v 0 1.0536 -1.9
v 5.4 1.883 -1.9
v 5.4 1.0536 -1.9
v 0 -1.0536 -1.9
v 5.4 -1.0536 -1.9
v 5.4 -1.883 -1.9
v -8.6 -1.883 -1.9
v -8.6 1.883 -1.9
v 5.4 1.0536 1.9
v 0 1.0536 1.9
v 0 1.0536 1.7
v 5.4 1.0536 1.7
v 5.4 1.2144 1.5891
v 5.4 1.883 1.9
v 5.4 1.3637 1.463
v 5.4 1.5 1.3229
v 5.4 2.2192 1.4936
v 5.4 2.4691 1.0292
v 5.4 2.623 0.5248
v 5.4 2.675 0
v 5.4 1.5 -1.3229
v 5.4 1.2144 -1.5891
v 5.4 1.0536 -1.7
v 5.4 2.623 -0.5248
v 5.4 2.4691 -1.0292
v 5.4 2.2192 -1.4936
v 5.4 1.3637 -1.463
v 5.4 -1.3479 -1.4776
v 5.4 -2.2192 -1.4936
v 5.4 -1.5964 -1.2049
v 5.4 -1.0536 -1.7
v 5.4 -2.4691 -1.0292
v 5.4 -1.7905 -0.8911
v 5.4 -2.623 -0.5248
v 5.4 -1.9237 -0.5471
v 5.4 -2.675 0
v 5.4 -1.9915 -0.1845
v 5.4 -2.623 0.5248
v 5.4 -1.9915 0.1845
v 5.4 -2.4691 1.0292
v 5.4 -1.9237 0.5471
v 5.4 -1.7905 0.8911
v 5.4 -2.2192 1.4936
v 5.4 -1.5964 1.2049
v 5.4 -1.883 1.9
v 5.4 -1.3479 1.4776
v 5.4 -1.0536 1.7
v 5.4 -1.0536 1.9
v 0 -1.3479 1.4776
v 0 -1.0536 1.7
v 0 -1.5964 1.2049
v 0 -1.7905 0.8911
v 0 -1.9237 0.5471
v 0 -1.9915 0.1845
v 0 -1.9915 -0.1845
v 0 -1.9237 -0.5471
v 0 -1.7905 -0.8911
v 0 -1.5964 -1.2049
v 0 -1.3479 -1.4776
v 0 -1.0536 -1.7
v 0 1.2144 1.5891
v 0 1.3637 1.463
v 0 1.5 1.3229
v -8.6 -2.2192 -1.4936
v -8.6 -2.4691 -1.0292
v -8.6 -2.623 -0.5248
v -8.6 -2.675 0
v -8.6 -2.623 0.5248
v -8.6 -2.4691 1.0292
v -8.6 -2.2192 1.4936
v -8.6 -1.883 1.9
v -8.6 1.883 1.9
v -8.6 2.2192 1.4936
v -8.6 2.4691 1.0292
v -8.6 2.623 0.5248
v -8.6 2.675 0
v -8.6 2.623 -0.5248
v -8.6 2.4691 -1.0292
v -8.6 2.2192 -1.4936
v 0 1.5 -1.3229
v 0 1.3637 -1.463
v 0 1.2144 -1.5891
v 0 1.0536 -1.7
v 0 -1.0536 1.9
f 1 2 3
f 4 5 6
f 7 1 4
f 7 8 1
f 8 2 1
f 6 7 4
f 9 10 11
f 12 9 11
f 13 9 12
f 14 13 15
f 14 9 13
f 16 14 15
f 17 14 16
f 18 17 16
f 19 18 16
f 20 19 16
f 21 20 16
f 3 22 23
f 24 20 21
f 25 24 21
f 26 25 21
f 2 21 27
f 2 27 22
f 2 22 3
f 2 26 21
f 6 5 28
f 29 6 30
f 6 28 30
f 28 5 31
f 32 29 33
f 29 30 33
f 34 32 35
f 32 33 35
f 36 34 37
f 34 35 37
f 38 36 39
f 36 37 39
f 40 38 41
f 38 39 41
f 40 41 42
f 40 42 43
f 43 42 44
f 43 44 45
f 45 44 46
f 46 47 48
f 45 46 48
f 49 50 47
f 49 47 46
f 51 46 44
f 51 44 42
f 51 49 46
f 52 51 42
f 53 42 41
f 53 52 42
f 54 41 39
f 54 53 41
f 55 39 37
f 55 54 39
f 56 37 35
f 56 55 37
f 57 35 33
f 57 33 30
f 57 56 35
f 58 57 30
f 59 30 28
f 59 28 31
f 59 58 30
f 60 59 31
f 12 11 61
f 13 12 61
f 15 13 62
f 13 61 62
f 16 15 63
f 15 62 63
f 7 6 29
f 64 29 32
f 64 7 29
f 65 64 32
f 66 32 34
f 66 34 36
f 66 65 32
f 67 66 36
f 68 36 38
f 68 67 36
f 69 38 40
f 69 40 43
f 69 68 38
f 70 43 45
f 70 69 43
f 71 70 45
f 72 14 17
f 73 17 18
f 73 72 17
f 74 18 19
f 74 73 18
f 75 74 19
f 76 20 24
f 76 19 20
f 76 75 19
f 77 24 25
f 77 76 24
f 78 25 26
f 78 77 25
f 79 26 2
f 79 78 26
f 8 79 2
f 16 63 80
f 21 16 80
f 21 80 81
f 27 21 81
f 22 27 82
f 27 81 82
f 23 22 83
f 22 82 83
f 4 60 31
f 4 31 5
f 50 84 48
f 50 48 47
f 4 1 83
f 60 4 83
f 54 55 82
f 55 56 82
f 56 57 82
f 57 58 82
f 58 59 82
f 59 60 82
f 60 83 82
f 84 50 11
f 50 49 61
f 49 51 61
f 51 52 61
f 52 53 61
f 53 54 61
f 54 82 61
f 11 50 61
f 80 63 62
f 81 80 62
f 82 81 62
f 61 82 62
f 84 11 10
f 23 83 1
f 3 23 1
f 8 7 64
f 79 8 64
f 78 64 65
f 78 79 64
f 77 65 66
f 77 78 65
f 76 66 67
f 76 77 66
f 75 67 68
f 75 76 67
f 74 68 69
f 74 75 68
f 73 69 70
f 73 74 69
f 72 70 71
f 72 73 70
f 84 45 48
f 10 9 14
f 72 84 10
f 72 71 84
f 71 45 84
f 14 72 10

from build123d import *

# Parameters (mm, degrees)
BOSS_EXTRUDE1_DEPTH   = 5.4
BOSS_EXTRUDE1_2_DEPTH = 5.4
BOSS_EXTRUDE2_START   = 8.6
BOSS_EXTRUDE2_DEPTH   = 8.6


with BuildPart() as part:
    # Sketch2 → Boss-Extrude1 (new body)
    with BuildSketch(Plane(origin=(0, 0, 0), x_dir=(0, 0, -1), z_dir=(1, 0, 0))):
        with BuildLine():
            Line((-1.9, -1.882983006), (-1.9, -1.053565375))
            Line((-1.9, -1.053565375), (-1.7, -1.053565375))
            ThreePointArc((-1.7, -1.053565375), (0, -2), (1.7, -1.053565375))
            Line((1.7, -1.053565375), (1.9, -1.053565375))
            Line((1.9, -1.053565375), (1.9, -1.882983006))
            ThreePointArc((1.9, -1.882983006), (0, -2.675), (-1.9, -1.882983006))
        make_face()
    extrude(amount=BOSS_EXTRUDE1_DEPTH)



with BuildPart() as body_2:
    # Sketch2 → Boss-Extrude1 2 (new body)
    with BuildSketch(Plane(origin=(0, 0, 0), x_dir=(0, 0, -1), z_dir=(1, 0, 0))):
        with BuildLine():
            Line((-1.9, 1.882983006), (-1.9, 1.053565375))
            Line((-1.9, 1.053565375), (-1.7, 1.053565375))
            ThreePointArc((-1.7, 1.053565375), (-1.527831887, 1.290631521), (-1.322875656, 1.5))
            Line((-1.322875656, 1.5), (1.322875656, 1.5))
            ThreePointArc((1.322875656, 1.5), (1.527831887, 1.290631521), (1.7, 1.053565375))
            Line((1.7, 1.053565375), (1.9, 1.053565375))
            Line((1.9, 1.053565375), (1.9, 1.882983006))
            ThreePointArc((1.9, 1.882983006), (0, 2.675), (-1.9, 1.882983006))
        make_face()
    extrude(amount=BOSS_EXTRUDE1_2_DEPTH)


with BuildPart() as part_1:
    add(part.part)

    add(body_2.part)  # Boss-Extrude2 merges body 2
    # Sketch3 → Boss-Extrude2 (add)
    with BuildSketch(Plane.ZY.offset(BOSS_EXTRUDE2_START)):
        with BuildLine():
            Line((1.9, -1.882983006), (1.9, 1.882983006))
            ThreePointArc((1.9, 1.882983006), (0, 2.675), (-1.9, 1.882983006))
            Line((-1.9, 1.882983006), (-1.9, -1.882983006))
            ThreePointArc((-1.9, -1.882983006), (0, -2.675), (1.9, -1.882983006))
        make_face()
    extrude(amount=-BOSS_EXTRUDE2_DEPTH)


solid = part_1.part
